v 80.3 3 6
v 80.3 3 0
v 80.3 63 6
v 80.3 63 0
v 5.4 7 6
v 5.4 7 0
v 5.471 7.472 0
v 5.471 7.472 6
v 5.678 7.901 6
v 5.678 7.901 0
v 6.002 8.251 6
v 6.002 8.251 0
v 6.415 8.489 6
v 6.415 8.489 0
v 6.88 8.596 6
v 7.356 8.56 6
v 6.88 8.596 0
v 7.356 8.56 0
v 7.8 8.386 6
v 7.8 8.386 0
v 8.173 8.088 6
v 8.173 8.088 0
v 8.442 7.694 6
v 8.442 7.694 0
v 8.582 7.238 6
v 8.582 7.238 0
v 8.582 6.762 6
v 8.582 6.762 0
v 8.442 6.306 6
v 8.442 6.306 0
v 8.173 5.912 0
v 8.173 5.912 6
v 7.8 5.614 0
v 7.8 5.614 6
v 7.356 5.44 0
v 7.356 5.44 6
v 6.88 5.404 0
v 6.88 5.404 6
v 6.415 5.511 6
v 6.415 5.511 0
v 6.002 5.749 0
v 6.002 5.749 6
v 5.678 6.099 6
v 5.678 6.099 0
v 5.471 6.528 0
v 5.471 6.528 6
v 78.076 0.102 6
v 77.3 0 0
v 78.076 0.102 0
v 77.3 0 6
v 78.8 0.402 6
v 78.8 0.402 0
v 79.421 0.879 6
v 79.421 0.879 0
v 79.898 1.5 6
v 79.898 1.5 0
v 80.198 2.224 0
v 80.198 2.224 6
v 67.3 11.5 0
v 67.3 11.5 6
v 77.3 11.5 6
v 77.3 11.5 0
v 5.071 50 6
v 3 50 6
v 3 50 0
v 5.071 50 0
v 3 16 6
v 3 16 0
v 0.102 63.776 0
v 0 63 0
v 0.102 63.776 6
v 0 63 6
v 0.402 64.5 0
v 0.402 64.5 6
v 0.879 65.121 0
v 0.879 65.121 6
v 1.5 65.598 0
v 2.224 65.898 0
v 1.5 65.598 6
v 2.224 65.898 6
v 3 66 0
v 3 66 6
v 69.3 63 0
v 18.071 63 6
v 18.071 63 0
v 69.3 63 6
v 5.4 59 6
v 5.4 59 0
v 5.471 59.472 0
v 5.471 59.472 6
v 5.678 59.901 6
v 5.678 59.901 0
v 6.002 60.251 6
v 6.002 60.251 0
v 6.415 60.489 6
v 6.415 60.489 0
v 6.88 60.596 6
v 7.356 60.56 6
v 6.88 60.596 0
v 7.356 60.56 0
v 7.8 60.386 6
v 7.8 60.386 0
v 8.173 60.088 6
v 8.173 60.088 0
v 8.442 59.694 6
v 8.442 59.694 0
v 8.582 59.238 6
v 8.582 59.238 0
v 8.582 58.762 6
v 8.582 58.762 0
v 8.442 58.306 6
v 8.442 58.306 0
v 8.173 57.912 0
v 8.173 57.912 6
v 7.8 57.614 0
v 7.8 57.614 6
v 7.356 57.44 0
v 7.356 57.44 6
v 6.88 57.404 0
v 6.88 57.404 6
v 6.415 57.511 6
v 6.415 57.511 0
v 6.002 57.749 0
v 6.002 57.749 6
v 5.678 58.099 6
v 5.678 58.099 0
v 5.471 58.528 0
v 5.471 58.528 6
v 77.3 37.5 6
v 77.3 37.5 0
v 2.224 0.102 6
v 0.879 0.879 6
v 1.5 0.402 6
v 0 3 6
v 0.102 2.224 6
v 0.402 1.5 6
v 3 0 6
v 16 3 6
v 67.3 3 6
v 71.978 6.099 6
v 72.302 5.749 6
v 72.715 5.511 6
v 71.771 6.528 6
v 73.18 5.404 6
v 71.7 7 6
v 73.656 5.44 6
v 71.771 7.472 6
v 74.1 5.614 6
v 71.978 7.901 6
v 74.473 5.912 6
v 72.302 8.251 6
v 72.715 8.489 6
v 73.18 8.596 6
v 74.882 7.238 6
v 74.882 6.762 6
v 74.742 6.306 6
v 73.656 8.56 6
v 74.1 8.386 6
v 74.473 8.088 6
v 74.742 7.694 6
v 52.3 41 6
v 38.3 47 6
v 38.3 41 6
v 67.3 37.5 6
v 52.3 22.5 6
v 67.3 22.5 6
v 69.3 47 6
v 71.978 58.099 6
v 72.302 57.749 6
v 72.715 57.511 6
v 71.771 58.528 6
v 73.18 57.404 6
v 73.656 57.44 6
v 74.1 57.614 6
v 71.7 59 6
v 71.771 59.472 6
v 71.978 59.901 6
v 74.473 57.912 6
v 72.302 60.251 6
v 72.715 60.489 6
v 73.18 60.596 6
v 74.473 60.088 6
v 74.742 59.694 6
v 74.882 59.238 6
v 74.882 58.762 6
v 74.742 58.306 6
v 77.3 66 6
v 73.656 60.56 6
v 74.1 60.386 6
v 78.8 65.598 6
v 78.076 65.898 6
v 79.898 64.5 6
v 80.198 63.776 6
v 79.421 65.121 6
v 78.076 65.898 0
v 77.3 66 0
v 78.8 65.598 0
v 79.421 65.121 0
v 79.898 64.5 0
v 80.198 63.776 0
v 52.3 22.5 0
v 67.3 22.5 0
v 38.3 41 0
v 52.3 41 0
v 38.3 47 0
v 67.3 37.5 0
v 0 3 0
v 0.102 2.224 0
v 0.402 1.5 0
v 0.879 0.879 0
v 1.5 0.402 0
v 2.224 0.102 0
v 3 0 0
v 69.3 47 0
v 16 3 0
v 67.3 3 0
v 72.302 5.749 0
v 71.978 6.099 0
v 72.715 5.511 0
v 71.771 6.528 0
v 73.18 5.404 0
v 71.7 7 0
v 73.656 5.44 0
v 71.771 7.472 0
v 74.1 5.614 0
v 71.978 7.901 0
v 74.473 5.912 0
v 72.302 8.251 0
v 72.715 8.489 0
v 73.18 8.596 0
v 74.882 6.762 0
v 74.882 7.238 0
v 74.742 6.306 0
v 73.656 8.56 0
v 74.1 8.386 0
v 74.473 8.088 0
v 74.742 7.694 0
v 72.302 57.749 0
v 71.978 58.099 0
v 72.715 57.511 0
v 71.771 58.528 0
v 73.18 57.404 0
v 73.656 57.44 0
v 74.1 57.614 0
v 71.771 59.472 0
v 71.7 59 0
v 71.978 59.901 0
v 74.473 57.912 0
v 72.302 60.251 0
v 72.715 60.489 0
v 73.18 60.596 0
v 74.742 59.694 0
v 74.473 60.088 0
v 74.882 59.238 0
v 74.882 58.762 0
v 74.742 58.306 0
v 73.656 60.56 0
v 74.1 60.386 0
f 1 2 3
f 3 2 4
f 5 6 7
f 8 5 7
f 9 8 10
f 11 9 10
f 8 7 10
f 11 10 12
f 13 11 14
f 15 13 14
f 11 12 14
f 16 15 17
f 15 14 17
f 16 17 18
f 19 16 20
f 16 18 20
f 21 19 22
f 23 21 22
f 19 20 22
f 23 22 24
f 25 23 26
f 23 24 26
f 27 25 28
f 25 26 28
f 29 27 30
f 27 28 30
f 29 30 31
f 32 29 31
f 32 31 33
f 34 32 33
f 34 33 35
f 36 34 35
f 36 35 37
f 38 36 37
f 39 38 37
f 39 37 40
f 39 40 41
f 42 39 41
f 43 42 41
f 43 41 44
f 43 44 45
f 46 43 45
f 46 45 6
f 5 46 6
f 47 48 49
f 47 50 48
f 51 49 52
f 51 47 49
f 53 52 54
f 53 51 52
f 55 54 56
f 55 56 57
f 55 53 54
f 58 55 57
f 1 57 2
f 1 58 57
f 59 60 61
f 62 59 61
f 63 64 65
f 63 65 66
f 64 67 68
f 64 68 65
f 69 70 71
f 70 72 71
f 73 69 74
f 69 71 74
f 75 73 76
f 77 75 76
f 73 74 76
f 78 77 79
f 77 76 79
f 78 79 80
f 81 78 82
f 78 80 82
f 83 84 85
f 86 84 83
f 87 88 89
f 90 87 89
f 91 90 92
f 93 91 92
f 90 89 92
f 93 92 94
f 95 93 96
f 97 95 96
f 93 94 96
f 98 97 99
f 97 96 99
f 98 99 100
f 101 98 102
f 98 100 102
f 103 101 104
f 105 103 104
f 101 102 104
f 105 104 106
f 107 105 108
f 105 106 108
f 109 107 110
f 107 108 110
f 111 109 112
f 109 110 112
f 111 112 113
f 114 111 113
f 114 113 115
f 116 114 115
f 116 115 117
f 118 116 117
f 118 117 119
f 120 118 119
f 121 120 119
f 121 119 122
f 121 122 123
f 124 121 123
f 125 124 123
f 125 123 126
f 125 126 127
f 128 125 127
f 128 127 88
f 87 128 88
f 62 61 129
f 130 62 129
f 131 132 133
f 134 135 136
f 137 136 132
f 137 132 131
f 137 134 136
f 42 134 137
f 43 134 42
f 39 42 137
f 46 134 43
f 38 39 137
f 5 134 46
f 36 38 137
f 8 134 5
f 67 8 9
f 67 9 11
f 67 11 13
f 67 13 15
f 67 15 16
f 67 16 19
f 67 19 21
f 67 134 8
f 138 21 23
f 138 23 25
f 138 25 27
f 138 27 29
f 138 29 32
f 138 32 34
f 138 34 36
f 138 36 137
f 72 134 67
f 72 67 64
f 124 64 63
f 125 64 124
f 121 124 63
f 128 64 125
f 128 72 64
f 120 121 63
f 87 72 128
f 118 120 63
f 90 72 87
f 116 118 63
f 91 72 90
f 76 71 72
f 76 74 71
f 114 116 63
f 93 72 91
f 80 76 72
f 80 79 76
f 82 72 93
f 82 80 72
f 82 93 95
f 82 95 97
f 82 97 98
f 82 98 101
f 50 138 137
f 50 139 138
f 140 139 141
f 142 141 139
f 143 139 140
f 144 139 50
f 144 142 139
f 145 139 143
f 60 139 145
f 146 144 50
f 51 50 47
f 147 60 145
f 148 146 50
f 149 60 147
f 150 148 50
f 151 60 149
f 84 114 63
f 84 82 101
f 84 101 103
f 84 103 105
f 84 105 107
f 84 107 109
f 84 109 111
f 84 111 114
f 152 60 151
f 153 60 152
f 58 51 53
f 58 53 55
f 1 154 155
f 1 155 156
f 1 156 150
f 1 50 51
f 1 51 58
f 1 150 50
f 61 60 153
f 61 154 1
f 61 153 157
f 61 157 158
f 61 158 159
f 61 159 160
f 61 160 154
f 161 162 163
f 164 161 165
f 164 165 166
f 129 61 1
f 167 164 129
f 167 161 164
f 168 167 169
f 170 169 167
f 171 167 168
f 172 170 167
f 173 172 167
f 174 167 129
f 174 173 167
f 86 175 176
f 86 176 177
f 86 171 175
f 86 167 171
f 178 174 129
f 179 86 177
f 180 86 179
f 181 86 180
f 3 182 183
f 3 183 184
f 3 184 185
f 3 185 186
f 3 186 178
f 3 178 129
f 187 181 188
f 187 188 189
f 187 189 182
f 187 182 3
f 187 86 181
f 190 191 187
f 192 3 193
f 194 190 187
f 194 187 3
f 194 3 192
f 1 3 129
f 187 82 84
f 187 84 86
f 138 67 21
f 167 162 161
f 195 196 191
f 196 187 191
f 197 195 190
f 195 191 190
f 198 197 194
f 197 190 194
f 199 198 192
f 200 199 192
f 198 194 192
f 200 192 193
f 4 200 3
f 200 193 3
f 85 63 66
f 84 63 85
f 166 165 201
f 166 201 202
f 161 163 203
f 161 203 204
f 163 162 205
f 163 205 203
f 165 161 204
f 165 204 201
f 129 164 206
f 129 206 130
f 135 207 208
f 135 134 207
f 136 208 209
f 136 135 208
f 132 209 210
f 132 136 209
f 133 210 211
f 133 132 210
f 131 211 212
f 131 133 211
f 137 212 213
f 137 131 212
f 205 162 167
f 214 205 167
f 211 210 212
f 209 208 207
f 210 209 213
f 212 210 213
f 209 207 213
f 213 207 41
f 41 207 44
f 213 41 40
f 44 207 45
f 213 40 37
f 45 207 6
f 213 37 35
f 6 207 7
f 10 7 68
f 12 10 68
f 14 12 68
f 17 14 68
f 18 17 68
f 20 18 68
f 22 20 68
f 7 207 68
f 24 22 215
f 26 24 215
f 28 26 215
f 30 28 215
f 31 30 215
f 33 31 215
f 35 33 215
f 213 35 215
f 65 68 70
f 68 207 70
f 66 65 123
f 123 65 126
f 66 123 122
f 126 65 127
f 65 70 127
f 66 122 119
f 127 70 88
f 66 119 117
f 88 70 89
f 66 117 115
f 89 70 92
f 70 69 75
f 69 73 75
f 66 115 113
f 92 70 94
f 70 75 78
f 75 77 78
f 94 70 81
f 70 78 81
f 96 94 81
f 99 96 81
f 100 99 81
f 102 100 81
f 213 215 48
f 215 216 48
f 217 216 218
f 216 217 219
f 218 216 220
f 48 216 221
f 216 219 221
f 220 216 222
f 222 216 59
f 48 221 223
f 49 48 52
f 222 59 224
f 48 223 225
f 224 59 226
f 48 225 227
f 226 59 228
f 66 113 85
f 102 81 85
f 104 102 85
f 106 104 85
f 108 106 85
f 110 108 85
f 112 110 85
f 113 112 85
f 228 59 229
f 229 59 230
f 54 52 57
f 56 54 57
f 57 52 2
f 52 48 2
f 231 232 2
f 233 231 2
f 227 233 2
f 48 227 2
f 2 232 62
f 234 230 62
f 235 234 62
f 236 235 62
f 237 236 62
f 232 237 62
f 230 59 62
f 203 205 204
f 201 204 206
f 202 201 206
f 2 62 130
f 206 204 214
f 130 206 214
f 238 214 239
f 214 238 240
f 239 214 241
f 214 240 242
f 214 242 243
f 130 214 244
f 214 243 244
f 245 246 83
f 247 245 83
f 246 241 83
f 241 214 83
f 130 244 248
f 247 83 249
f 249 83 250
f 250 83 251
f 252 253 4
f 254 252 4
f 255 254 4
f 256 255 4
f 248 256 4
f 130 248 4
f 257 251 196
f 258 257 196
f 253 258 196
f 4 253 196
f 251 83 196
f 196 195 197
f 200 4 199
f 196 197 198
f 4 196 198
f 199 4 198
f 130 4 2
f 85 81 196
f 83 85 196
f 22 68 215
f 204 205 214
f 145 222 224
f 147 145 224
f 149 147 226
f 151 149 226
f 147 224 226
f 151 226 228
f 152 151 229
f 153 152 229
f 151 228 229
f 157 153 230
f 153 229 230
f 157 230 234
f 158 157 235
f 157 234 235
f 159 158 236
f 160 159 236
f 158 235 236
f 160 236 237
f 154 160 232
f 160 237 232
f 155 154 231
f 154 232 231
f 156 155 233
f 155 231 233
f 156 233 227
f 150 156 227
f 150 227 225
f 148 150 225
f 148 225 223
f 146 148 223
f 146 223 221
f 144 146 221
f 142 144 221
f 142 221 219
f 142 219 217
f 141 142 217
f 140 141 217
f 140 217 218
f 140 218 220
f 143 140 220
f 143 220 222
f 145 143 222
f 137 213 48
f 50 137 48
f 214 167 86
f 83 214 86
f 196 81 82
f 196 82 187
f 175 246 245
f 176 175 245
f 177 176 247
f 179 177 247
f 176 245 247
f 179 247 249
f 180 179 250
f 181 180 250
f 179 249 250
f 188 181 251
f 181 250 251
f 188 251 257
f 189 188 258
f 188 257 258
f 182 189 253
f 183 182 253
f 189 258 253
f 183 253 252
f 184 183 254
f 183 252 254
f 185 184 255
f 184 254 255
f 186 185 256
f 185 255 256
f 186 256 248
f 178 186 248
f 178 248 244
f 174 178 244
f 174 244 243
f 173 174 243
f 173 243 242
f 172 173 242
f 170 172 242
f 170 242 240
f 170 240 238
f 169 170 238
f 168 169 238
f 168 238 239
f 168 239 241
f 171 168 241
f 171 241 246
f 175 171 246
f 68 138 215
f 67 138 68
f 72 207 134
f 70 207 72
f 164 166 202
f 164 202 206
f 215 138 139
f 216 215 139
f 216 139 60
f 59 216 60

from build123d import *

# Parameters (mm, degrees)
SKETCH1_W                  = 80.3
SKETCH1_H                  = 66
BOSS_EXTRUDE1_DEPTH        = 6
F_3_2_3_2_DIAMETER_HOLE1_D = 3.2
FILLET1_R                  = 3
SKETCH4_W                  = 19
SKETCH4_H                  = 34
SKETCH4_W_2                = 31
SKETCH4_H_2                = 16
SKETCH4_W_3                = 7
SKETCH4_H_3                = 7
SKETCH4_W_4                = 13
SKETCH4_H_4                = 17
SKETCH4_W_5                = 40
SKETCH4_H_5                = 19.5
SKETCH4_W_6                = 10
SKETCH4_H_6                = 26
CUT_EXTRUDE1_DEPTH         = 7
CUT_EXTRUDE3_DEPTH         = 7


with BuildPart() as part:
    # Sketch1 → Boss-Extrude1 (new body)
    with BuildSketch(Plane.XY):
        with Locations((40.15, 33)):
            Rectangle(SKETCH1_W, SKETCH1_H)
    extrude(amount=BOSS_EXTRUDE1_DEPTH)

    # Ø3.2 (3.2) Diameter Hole1 (through all)
    with Locations(Plane.XY.offset(6)):
        with Locations((7, 59), (73.3, 59), (73.3, 7), (7, 7)):
            Hole(F_3_2_3_2_DIAMETER_HOLE1_D / 2)

    # Fillet1
    fillet1_edges = [part.edges().sort_by_distance(p)[0] for p in [
        (0, 66, 3),
        (80.3, 66, 3),
        (80.3, 0, 3),
        (0, 0, 3),
    ]]
    fillet(fillet1_edges, radius=FILLET1_R)

    # Sketch4 → Cut-Extrude1 (cut, through all)
    with BuildSketch(Plane.XY.offset(6)):
        with Locations((12.5, 33)):
            Rectangle(SKETCH4_W, SKETCH4_H)
        with Locations((53.8, 55)):
            Rectangle(SKETCH4_W_2, SKETCH4_H_2)
        with Locations((31.5, 53)):
            Rectangle(SKETCH4_W_3, SKETCH4_H_3)
        with Locations((45.8, 32.5)):
            Rectangle(SKETCH4_W_4, SKETCH4_H_4)
        with Locations((45.829355907, 12.75)):
            Rectangle(SKETCH4_W_5, SKETCH4_H_5)
        with Locations((72.3, 24.5)):
            Rectangle(SKETCH4_W_6, SKETCH4_H_6)
    extrude(amount=-CUT_EXTRUDE1_DEPTH, mode=Mode.SUBTRACT)

    # Sketch5 → Cut-Extrude3 (cut, through all)
    with BuildSketch(Plane.XY.offset(6)):
        Polygon((67.3, 11.5), (67.3, 3), (16, 3), (3, 16), (3, 50), (5.071067812, 50), (18.071067812, 63), (38.3, 63), (69.3, 63), (69.3, 47), (38.3, 47), (38.3, 41), (52.3, 41), (52.3, 22.5), (67.3, 22.5), align=None)
    extrude(amount=-CUT_EXTRUDE3_DEPTH, mode=Mode.SUBTRACT)


solid = part.part
